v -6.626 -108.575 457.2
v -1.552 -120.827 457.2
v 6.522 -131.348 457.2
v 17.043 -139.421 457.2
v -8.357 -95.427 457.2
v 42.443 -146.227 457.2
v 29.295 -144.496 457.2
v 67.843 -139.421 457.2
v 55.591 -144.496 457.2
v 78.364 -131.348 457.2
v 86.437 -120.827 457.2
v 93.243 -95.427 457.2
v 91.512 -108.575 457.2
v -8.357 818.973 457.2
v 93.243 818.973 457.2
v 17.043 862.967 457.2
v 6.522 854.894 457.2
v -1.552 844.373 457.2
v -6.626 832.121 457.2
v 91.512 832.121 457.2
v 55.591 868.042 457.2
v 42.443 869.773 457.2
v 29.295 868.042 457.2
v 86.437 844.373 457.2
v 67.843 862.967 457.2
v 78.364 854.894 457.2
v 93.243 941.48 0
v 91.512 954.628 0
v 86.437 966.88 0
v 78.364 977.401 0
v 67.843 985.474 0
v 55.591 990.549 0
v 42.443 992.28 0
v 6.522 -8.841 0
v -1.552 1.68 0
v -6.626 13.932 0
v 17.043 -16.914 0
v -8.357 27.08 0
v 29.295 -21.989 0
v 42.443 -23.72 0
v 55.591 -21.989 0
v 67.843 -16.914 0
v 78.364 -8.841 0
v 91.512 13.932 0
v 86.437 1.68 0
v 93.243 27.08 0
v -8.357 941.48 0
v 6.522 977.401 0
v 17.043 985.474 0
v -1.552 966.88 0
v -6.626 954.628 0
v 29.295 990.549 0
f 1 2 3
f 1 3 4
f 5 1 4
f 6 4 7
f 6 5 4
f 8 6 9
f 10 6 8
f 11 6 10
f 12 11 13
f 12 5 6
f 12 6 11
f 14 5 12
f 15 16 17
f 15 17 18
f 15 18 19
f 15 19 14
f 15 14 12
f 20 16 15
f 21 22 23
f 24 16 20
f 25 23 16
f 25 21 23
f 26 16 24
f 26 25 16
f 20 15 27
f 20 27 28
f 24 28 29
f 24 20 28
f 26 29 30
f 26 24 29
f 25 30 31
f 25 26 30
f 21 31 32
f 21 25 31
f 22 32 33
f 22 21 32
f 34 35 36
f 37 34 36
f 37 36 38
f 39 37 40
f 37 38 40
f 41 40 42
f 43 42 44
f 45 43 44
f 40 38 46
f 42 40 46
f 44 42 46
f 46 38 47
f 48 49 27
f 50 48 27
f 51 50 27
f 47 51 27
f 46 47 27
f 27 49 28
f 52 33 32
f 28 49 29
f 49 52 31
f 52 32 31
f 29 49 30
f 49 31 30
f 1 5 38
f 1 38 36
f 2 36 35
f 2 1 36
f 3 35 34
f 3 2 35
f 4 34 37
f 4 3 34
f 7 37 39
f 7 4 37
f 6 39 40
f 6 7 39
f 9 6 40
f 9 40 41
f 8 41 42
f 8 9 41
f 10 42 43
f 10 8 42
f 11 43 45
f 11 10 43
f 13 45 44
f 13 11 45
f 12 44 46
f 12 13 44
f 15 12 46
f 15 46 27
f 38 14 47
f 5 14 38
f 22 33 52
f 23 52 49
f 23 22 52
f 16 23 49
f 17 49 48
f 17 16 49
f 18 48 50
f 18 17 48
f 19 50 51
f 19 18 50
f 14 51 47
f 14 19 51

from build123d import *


with BuildPart() as f2:
    # F2: sweep along a path in F1
    with BuildLine(Plane.YZ) as f2_path:
        Line((0, 0), (-122.506371, 457.2))
    # F0 (on Top) → F2 (sweep)
    with BuildSketch(Plane.XY):
        with BuildLine():
            ThreePointArc((42.44258, 992.279678), (6.521556, 977.400702), (-8.35742, 941.479678))
            Line((-8.35742, 941.479678), (-8.35742, 27.079678))
            ThreePointArc((-8.35742, 27.079678), (6.521556, -8.841347), (42.44258, -23.720322))
            ThreePointArc((42.44258, -23.720322), (78.363605, -8.841347), (93.24258, 27.079678))
            Line((93.24258, 27.079678), (93.24258, 941.479678))
            ThreePointArc((93.24258, 941.479678), (78.363605, 977.400702), (42.44258, 992.279678))
        make_face()
    sweep(path=f2_path.line)


solid = f2.part
